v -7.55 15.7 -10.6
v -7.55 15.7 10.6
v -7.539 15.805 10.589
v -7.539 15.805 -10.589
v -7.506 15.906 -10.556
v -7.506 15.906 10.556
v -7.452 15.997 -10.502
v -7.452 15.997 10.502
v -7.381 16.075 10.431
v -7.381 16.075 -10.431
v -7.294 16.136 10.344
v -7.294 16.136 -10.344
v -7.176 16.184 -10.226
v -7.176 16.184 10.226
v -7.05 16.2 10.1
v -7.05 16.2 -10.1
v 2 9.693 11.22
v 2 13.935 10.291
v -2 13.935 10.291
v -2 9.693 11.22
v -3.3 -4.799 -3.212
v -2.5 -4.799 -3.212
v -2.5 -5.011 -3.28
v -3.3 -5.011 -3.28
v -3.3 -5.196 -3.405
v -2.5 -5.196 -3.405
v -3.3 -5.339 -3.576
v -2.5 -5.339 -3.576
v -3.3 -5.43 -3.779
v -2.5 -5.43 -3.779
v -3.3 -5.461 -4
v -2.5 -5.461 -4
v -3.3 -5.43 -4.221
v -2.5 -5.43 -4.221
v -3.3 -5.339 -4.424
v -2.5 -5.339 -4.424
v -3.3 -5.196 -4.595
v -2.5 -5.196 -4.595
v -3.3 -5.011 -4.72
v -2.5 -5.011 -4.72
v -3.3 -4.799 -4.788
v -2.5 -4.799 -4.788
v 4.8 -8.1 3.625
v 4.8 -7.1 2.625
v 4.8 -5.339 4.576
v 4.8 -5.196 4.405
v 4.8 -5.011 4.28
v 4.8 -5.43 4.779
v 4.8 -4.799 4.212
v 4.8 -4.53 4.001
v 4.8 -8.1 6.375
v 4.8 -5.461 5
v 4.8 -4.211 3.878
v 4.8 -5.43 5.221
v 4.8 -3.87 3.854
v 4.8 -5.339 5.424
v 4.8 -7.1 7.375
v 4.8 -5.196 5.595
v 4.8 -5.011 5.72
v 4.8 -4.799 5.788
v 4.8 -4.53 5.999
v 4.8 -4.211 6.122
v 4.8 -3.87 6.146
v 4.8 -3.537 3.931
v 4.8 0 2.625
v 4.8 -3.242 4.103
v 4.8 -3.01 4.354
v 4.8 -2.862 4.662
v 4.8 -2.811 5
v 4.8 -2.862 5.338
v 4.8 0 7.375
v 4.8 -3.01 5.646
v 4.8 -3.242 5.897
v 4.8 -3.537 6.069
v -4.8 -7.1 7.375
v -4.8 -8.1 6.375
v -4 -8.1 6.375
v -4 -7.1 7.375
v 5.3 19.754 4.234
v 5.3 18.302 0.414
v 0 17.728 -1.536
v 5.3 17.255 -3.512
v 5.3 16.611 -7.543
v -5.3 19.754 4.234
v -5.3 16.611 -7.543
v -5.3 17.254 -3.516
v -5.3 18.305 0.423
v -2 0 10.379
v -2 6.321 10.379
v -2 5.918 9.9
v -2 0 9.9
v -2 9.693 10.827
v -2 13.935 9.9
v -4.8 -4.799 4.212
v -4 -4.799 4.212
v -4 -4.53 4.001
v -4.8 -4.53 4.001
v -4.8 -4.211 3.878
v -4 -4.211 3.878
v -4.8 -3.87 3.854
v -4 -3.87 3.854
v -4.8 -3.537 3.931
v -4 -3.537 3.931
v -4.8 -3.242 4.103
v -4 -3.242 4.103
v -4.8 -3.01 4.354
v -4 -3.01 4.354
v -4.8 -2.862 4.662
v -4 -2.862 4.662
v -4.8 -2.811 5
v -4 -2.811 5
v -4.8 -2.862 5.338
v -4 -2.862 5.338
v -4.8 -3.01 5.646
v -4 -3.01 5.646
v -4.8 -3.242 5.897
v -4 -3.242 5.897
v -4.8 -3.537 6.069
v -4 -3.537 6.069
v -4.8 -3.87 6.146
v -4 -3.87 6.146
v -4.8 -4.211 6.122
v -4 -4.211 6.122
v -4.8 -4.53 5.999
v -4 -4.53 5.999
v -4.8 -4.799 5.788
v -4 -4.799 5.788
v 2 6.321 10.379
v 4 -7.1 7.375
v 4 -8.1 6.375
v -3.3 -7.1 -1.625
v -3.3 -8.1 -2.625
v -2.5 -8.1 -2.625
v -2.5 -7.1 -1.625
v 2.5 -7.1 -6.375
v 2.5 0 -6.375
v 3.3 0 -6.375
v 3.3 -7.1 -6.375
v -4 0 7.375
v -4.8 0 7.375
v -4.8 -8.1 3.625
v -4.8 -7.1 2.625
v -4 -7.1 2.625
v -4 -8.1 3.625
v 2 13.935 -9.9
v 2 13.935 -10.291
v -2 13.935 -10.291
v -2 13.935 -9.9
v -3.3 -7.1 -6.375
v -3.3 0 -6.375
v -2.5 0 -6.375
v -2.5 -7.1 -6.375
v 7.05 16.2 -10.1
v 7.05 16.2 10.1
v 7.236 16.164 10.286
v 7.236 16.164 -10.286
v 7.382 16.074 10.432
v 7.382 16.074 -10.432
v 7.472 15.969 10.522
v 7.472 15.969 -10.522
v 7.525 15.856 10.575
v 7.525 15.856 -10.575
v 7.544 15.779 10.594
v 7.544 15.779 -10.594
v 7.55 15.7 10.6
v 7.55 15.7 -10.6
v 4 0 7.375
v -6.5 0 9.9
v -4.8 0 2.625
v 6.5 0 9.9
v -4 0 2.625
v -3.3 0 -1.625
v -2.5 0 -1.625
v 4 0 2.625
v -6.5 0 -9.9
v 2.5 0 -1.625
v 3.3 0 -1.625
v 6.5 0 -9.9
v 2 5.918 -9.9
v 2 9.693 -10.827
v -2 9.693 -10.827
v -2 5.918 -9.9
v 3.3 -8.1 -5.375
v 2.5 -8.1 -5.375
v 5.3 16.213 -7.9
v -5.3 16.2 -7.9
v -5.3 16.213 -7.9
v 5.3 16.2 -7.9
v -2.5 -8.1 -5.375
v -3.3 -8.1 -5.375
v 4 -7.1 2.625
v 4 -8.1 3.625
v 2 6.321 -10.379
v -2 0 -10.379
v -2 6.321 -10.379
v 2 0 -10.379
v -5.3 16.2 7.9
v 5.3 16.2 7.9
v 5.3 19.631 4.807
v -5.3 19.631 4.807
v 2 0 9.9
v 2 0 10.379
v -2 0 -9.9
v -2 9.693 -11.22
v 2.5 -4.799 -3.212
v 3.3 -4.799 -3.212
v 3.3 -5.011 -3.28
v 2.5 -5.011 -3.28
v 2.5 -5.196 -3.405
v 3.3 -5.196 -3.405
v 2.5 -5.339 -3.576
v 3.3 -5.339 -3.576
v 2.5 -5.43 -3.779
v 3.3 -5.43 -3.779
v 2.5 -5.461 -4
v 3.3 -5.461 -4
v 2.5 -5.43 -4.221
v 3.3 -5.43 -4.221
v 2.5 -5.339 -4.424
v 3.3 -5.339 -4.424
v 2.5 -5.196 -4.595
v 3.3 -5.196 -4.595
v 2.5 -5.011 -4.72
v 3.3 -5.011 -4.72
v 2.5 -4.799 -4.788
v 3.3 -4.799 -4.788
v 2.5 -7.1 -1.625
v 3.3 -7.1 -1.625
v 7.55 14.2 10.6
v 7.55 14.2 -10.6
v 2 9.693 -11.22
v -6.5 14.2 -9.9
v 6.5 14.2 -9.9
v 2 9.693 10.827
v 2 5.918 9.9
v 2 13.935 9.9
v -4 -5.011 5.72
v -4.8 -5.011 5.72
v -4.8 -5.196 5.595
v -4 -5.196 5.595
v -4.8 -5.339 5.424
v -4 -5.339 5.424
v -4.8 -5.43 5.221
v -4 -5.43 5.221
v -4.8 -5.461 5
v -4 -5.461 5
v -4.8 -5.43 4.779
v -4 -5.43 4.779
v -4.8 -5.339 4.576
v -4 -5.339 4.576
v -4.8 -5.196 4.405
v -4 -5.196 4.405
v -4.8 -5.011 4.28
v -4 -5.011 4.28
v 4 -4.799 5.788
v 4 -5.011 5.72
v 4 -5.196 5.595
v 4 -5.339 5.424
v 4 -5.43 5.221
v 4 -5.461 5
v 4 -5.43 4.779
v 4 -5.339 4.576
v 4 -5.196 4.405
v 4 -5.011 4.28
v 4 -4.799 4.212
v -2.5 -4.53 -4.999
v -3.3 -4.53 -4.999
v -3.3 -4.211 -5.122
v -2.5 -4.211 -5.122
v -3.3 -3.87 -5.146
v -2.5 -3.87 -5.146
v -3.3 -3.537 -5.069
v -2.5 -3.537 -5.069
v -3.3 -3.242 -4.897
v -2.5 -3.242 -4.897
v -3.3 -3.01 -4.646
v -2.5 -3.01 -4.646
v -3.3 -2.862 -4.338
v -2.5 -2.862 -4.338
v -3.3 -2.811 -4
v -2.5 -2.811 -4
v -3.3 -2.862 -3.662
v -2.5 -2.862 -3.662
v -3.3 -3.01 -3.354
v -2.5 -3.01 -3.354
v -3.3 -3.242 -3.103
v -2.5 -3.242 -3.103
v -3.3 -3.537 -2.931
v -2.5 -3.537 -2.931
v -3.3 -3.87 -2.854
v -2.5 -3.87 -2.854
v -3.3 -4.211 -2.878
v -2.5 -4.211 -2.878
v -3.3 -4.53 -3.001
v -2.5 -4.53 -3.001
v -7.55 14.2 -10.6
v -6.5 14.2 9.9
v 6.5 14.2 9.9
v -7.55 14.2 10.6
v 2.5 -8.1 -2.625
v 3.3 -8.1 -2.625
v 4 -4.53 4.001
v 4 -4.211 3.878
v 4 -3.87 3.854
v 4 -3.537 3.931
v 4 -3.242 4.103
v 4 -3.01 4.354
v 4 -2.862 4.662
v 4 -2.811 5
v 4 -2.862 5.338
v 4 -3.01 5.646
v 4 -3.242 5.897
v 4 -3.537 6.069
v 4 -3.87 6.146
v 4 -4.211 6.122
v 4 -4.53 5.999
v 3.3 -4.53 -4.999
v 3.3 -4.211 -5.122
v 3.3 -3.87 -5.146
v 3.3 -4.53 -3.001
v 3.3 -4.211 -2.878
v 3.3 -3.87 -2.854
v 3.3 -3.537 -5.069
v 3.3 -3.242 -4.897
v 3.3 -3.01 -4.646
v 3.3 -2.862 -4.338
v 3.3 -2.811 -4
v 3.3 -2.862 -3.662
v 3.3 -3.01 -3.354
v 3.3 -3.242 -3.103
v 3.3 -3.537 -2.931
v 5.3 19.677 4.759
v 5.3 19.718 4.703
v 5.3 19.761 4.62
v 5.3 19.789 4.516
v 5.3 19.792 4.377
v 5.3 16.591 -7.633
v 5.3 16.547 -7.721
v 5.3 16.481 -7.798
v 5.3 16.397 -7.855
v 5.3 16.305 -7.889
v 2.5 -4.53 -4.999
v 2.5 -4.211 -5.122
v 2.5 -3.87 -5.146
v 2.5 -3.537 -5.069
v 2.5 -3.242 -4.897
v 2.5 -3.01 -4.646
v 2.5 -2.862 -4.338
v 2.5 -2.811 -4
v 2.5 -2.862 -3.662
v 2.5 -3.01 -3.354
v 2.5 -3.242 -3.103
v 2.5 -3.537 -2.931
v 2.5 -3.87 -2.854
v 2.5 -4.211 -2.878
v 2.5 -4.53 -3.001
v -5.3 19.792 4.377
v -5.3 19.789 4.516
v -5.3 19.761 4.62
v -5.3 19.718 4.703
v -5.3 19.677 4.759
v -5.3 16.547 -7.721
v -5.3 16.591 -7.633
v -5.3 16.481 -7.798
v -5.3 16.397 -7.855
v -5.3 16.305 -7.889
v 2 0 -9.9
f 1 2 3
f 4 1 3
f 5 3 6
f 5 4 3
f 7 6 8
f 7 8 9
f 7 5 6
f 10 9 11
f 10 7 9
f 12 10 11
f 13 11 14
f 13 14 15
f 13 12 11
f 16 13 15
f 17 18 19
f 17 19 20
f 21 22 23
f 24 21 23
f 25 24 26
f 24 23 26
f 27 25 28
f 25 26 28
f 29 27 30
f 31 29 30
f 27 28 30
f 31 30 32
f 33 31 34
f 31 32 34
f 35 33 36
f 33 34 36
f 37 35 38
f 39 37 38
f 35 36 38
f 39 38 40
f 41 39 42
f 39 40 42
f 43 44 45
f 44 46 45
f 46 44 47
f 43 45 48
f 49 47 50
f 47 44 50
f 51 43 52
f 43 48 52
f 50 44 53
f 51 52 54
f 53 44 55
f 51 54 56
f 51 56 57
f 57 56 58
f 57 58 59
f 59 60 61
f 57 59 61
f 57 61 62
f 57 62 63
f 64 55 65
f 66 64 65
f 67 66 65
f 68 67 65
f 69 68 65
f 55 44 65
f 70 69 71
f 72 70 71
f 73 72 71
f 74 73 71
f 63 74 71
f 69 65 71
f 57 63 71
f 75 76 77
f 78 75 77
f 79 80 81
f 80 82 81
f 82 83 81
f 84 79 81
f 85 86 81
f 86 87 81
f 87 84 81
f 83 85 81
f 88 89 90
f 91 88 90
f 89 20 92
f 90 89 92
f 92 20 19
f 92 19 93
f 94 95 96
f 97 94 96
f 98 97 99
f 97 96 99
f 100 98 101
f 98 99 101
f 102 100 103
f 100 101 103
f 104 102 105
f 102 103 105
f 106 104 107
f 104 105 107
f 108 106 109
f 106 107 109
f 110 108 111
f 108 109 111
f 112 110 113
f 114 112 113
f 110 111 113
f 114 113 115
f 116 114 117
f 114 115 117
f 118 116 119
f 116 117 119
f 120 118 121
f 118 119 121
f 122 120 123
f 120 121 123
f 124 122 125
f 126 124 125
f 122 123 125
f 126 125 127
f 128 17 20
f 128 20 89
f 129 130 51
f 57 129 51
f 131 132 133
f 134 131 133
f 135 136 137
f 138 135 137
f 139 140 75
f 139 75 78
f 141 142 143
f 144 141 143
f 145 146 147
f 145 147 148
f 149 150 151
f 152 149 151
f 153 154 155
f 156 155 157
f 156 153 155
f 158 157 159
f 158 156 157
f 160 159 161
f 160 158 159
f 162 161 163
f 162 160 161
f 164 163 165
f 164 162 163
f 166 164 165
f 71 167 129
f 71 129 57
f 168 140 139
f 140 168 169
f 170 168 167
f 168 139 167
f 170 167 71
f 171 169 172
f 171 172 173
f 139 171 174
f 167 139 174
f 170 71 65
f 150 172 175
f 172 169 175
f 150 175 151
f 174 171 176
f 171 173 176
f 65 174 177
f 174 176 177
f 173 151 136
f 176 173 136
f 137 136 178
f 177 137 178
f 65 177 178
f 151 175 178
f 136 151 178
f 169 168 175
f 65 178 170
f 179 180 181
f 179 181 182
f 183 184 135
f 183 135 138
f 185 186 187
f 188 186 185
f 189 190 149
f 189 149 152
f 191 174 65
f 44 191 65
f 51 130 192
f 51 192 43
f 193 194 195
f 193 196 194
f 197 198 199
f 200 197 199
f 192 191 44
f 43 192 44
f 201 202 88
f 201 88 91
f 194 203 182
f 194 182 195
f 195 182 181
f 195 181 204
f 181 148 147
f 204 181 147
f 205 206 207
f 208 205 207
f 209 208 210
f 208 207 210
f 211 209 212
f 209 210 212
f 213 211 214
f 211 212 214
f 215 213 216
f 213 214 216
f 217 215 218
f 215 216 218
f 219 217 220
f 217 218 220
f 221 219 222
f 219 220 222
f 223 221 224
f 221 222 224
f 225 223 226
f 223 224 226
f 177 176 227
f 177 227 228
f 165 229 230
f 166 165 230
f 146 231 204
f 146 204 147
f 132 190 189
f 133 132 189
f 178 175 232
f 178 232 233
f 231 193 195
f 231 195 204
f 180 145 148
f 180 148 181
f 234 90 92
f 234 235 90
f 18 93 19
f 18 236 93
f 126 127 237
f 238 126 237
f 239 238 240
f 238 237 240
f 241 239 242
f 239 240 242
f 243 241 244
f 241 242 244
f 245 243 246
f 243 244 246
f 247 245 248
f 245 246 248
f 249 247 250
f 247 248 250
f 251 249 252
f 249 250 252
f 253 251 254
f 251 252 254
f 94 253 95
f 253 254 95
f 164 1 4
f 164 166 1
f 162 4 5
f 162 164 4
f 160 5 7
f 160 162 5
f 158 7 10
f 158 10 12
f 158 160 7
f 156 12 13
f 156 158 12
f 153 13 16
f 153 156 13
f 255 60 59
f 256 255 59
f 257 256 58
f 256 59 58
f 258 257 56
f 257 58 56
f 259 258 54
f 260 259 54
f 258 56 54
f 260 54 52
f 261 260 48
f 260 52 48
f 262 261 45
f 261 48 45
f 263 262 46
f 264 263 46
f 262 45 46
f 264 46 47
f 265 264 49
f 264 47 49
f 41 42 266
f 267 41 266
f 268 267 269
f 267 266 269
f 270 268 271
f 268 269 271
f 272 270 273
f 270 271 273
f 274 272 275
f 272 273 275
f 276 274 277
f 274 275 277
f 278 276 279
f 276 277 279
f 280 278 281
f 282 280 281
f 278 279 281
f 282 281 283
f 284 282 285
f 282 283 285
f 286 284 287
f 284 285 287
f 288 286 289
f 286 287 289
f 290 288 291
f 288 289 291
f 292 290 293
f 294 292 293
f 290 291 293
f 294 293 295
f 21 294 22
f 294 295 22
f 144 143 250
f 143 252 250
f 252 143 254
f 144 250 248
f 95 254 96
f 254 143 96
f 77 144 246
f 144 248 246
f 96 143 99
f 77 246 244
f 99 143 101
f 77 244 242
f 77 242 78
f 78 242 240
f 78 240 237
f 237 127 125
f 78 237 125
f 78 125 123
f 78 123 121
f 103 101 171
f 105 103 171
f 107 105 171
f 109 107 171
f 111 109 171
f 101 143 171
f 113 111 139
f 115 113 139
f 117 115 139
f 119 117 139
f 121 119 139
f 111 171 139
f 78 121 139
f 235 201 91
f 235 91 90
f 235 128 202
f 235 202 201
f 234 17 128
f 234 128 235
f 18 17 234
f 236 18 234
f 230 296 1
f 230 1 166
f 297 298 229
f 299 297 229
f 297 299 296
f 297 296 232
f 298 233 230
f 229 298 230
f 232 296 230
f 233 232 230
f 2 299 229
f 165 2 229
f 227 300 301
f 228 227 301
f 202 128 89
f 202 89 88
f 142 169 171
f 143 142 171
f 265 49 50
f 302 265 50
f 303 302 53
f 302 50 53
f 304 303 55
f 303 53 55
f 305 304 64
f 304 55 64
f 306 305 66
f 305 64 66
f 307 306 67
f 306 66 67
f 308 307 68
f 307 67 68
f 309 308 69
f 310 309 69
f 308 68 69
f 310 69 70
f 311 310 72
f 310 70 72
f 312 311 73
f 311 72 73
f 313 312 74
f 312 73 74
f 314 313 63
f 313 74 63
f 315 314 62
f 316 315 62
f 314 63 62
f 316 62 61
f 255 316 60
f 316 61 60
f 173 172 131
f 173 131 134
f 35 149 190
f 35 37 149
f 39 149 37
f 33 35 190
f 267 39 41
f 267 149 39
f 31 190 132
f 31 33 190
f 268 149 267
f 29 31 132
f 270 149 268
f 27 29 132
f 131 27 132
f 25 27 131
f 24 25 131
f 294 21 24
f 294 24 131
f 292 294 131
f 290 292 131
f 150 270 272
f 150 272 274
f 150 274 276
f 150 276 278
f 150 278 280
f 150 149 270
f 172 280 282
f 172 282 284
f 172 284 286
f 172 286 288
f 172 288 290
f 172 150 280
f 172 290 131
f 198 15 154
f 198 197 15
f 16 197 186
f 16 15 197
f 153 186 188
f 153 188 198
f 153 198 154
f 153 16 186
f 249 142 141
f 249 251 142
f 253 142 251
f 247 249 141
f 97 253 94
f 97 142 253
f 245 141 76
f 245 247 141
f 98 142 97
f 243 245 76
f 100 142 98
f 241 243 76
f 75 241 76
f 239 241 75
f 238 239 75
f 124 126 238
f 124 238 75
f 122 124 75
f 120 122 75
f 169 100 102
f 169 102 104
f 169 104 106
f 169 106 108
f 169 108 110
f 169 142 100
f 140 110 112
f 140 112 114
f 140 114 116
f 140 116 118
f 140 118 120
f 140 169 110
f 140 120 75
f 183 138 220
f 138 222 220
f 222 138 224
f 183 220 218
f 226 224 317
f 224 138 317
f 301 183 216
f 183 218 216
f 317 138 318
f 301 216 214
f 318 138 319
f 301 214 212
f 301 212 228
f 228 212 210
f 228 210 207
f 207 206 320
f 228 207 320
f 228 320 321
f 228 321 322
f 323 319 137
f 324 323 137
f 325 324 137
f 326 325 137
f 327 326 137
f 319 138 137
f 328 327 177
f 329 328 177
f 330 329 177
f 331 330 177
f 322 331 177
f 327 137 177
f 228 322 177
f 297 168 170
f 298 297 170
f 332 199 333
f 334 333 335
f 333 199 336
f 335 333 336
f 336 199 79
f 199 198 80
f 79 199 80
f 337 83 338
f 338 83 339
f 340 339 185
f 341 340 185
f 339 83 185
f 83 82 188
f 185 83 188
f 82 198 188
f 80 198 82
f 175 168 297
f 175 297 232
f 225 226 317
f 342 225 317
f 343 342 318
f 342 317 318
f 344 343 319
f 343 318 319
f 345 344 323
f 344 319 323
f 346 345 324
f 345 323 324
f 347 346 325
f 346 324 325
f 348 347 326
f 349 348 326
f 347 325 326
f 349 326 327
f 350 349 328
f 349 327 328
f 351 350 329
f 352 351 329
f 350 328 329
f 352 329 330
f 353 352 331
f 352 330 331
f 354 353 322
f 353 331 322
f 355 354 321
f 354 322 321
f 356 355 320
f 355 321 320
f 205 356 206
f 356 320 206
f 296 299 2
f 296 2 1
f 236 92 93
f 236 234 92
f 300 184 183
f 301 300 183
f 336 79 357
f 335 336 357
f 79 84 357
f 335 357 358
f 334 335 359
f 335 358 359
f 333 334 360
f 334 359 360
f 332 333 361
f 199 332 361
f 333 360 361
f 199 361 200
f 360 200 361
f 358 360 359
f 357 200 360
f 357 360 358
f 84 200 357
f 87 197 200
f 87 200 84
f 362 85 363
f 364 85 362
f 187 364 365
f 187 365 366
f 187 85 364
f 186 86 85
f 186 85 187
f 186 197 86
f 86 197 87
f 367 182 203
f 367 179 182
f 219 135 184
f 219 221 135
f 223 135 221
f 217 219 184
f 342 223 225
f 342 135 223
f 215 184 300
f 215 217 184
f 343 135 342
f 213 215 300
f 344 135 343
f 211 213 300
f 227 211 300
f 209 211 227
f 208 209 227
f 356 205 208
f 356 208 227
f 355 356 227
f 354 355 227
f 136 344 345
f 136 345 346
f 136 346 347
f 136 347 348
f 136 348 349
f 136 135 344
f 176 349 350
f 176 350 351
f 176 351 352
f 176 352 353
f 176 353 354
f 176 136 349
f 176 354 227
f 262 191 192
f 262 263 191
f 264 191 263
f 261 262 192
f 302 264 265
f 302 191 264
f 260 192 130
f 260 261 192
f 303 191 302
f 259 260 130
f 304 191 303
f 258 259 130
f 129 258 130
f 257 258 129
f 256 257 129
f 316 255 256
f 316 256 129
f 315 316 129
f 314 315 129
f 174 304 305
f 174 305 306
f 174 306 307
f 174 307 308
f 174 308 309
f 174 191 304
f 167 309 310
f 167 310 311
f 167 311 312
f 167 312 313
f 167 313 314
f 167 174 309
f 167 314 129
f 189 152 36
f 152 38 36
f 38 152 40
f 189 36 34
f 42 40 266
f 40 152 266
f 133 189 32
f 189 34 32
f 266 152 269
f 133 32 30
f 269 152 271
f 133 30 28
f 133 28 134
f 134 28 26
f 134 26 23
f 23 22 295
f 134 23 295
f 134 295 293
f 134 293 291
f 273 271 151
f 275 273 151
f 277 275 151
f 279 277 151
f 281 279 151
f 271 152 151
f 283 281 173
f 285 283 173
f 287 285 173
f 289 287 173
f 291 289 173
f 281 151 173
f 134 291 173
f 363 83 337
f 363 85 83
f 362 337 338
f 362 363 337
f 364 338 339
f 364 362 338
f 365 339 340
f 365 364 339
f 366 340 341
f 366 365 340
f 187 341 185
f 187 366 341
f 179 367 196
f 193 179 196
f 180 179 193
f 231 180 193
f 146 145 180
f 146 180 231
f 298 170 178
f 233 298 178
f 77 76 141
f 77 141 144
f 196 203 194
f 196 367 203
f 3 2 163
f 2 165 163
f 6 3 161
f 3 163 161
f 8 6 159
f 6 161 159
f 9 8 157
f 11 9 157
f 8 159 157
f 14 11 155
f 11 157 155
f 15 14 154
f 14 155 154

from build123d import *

# Parameters (mm, degrees)
SKETCH1_W                  = 13
SKETCH1_H                  = 19.8
BOSS_EXTRUDE1_DEPTH        = 14.2
SKETCH2_W                  = 15.1
SKETCH2_H                  = 21.2
BOSS_EXTRUDE2_DEPTH        = 2
FILLET1_R                  = 0.5
SKETCH3_W                  = 10.6
SKETCH3_H                  = 15.8
BOSS_EXTRUDE3_DEPTH        = 3.7
CUT_EXTRUDE1_DEPTH         = 3.25
CUT_EXTRUDE1_DEPTH_BACK    = 13.85
FILLET2_R                  = 0.5
FILLET3_R                  = 0.4
BOSS_EXTRUDE4_DEPTH        = 2
BOSS_EXTRUDE4_DEPTH_BACK   = 2
BOSS_EXTRUDE4_2_DEPTH      = 2
BOSS_EXTRUDE4_2_DEPTH_BACK = 2
SKETCH9_W                  = 0.8
SKETCH9_H                  = 4.75
BOSS_EXTRUDE5_DEPTH        = 8.1
CHAMFER1_SIZE              = 1
CUT_EXTRUDE2_DEPTH         = 13.35


with BuildPart() as part:
    # Sketch1 → Boss-Extrude1 (new body)
    with BuildSketch(Plane(origin=(0, 0, 0), x_dir=(1, 0, 0), z_dir=(0, 1, 0))):
        Rectangle(SKETCH1_W, SKETCH1_H)
    extrude(amount=BOSS_EXTRUDE1_DEPTH)

    # Sketch2 → Boss-Extrude2 (add)
    with BuildSketch(Plane(origin=(0, 14.2, 0), x_dir=(1, 0, 0), z_dir=(0, 1, 0))):
        Rectangle(SKETCH2_W, SKETCH2_H)
    extrude(amount=BOSS_EXTRUDE2_DEPTH)

    # Fillet1
    fillet1_edges = [part.edges().sort_by_distance(p)[0] for p in [
        (7.55, 16.2, 0),
        (0, 16.2, -10.6),
        (-7.55, 16.2, 0),
        (0, 16.2, 10.6),
    ]]
    fillet(fillet1_edges, radius=FILLET1_R)

    # Sketch3 → Boss-Extrude3 (add)
    with BuildSketch(Plane(origin=(0, 16.2, 0), x_dir=(1, 0, 0), z_dir=(0, 1, 0))):
        Rectangle(SKETCH3_W, SKETCH3_H)
    extrude(amount=BOSS_EXTRUDE3_DEPTH)

    # Sketch4 → Cut-Extrude1 (cut, two sides)
    with BuildSketch(Plane(origin=(5.3, 0, 0), x_dir=(0, 0, -1), z_dir=(1, 0, 0))) as cut_extrude1_sk:
        Polygon((-7.9, 19.9), (-7.9, 16.2), (-4.563876161, 19.9), align=None)
        with BuildLine():
            Line((7.9, 19.9), (-4.563876161, 19.9))
            add(Edge.make_bspline(
                [(-4.563876161, 19.9), (1.403607579, 17.21890735), (7.9, 16.574072903)],
                knots=[0, 0, 0, 1, 1, 1], degree=2))
            Line((7.9, 16.574072903), (7.9, 19.9))
        make_face()
    extrude(amount=CUT_EXTRUDE1_DEPTH, mode=Mode.SUBTRACT)
    extrude(cut_extrude1_sk.sketch, amount=-CUT_EXTRUDE1_DEPTH_BACK, mode=Mode.SUBTRACT)

    # Fillet2
    fillet2_edges = [part.edges().sort_by_distance(p)[0] for p in [
        (0, 19.9, 4.563876161),
    ]]
    fillet(fillet2_edges, radius=FILLET2_R)

    # Fillet3
    fillet3_edges = [part.edges().sort_by_distance(p)[0] for p in [
        (0, 16.574072903, -7.9),
    ]]
    fillet(fillet3_edges, radius=FILLET3_R)

    # Sketch9 → Boss-Extrude5 (add)
    with BuildSketch(Plane.XZ):
        with Locations((-4.4, 5)):
            Rectangle(SKETCH9_W, SKETCH9_H)
        with Locations((-2.9, -4)):
            Rectangle(SKETCH9_W, SKETCH9_H)
        with Locations((2.9, -4)):
            Rectangle(SKETCH9_W, SKETCH9_H)
        with Locations((4.4, 5)):
            Rectangle(SKETCH9_W, SKETCH9_H)
    extrude(amount=BOSS_EXTRUDE5_DEPTH)

    # Chamfer1
    chamfer1_edges = [part.edges().sort_by_distance(p)[0] for p in [
        (-4.4, -8.1, 2.625),
        (-4.4, -8.1, 7.375),
        (-2.9, -8.1, -6.375),
        (-2.9, -8.1, -1.625),
        (2.9, -8.1, -1.625),
        (2.9, -8.1, -6.375),
        (4.4, -8.1, 7.375),
        (4.4, -8.1, 2.625),
    ]]
    chamfer(chamfer1_edges, length=CHAMFER1_SIZE)

    # Sketch10 → Cut-Extrude2 (cut, through all)
    with BuildSketch(Plane(origin=(4.8, 0, 0), x_dir=(0, 0, -1), z_dir=(1, 0, 0))):
        with BuildLine():
            ThreePointArc((-4.211904987, -4.798606273), (-5, -2.811106273), (-5.788095013, -4.798606273))
            ThreePointArc((-5.788095013, -4.798606273), (-5, -5.461106273), (-4.211904987, -4.798606273))
        make_face()
        with BuildLine():
            ThreePointArc((4.788095013, -4.798606273), (4, -2.811106273), (3.211904987, -4.798606273))
            ThreePointArc((3.211904987, -4.798606273), (4, -5.461106273), (4.788095013, -4.798606273))
        make_face()
    extrude(amount=-CUT_EXTRUDE2_DEPTH, mode=Mode.SUBTRACT)


with BuildPart() as body_2:
    # Sketch8 → Boss-Extrude4 (new body, two sides)
    with BuildSketch(Plane(origin=(0, 0, 0), x_dir=(0, 0, -1), z_dir=(1, 0, 0))) as boss_extrude4_sk:
        Polygon((-9.9, 13.934809719), (-10.290851987, 13.934809719), (-11.220244873, 9.692999395), (-10.379004118, 6.321166149), (-10.379004118, 0), (-9.9, 0), (-9.9, 5.917943641), (-10.827447629, 9.692999395), align=None)
    extrude(amount=BOSS_EXTRUDE4_DEPTH)
    extrude(boss_extrude4_sk.sketch, amount=-BOSS_EXTRUDE4_DEPTH_BACK)


with BuildPart() as body_3:
    # Sketch8 → Boss-Extrude4 2 (new body, two sides)
    with BuildSketch(Plane(origin=(0, 0, 0), x_dir=(0, 0, -1), z_dir=(1, 0, 0))) as boss_extrude4_2_sk:
        Polygon((10.379004118, 0), (10.379004118, 6.321166149), (11.220244873, 9.692999395), (10.290851987, 13.934809719), (9.9, 13.934809719), (10.827447629, 9.692999395), (9.9, 5.917943641), (9.9, 0), align=None)
    extrude(amount=BOSS_EXTRUDE4_2_DEPTH)
    extrude(boss_extrude4_2_sk.sketch, amount=-BOSS_EXTRUDE4_2_DEPTH_BACK)


solid = Compound([part.part, body_2.part, body_3.part])
